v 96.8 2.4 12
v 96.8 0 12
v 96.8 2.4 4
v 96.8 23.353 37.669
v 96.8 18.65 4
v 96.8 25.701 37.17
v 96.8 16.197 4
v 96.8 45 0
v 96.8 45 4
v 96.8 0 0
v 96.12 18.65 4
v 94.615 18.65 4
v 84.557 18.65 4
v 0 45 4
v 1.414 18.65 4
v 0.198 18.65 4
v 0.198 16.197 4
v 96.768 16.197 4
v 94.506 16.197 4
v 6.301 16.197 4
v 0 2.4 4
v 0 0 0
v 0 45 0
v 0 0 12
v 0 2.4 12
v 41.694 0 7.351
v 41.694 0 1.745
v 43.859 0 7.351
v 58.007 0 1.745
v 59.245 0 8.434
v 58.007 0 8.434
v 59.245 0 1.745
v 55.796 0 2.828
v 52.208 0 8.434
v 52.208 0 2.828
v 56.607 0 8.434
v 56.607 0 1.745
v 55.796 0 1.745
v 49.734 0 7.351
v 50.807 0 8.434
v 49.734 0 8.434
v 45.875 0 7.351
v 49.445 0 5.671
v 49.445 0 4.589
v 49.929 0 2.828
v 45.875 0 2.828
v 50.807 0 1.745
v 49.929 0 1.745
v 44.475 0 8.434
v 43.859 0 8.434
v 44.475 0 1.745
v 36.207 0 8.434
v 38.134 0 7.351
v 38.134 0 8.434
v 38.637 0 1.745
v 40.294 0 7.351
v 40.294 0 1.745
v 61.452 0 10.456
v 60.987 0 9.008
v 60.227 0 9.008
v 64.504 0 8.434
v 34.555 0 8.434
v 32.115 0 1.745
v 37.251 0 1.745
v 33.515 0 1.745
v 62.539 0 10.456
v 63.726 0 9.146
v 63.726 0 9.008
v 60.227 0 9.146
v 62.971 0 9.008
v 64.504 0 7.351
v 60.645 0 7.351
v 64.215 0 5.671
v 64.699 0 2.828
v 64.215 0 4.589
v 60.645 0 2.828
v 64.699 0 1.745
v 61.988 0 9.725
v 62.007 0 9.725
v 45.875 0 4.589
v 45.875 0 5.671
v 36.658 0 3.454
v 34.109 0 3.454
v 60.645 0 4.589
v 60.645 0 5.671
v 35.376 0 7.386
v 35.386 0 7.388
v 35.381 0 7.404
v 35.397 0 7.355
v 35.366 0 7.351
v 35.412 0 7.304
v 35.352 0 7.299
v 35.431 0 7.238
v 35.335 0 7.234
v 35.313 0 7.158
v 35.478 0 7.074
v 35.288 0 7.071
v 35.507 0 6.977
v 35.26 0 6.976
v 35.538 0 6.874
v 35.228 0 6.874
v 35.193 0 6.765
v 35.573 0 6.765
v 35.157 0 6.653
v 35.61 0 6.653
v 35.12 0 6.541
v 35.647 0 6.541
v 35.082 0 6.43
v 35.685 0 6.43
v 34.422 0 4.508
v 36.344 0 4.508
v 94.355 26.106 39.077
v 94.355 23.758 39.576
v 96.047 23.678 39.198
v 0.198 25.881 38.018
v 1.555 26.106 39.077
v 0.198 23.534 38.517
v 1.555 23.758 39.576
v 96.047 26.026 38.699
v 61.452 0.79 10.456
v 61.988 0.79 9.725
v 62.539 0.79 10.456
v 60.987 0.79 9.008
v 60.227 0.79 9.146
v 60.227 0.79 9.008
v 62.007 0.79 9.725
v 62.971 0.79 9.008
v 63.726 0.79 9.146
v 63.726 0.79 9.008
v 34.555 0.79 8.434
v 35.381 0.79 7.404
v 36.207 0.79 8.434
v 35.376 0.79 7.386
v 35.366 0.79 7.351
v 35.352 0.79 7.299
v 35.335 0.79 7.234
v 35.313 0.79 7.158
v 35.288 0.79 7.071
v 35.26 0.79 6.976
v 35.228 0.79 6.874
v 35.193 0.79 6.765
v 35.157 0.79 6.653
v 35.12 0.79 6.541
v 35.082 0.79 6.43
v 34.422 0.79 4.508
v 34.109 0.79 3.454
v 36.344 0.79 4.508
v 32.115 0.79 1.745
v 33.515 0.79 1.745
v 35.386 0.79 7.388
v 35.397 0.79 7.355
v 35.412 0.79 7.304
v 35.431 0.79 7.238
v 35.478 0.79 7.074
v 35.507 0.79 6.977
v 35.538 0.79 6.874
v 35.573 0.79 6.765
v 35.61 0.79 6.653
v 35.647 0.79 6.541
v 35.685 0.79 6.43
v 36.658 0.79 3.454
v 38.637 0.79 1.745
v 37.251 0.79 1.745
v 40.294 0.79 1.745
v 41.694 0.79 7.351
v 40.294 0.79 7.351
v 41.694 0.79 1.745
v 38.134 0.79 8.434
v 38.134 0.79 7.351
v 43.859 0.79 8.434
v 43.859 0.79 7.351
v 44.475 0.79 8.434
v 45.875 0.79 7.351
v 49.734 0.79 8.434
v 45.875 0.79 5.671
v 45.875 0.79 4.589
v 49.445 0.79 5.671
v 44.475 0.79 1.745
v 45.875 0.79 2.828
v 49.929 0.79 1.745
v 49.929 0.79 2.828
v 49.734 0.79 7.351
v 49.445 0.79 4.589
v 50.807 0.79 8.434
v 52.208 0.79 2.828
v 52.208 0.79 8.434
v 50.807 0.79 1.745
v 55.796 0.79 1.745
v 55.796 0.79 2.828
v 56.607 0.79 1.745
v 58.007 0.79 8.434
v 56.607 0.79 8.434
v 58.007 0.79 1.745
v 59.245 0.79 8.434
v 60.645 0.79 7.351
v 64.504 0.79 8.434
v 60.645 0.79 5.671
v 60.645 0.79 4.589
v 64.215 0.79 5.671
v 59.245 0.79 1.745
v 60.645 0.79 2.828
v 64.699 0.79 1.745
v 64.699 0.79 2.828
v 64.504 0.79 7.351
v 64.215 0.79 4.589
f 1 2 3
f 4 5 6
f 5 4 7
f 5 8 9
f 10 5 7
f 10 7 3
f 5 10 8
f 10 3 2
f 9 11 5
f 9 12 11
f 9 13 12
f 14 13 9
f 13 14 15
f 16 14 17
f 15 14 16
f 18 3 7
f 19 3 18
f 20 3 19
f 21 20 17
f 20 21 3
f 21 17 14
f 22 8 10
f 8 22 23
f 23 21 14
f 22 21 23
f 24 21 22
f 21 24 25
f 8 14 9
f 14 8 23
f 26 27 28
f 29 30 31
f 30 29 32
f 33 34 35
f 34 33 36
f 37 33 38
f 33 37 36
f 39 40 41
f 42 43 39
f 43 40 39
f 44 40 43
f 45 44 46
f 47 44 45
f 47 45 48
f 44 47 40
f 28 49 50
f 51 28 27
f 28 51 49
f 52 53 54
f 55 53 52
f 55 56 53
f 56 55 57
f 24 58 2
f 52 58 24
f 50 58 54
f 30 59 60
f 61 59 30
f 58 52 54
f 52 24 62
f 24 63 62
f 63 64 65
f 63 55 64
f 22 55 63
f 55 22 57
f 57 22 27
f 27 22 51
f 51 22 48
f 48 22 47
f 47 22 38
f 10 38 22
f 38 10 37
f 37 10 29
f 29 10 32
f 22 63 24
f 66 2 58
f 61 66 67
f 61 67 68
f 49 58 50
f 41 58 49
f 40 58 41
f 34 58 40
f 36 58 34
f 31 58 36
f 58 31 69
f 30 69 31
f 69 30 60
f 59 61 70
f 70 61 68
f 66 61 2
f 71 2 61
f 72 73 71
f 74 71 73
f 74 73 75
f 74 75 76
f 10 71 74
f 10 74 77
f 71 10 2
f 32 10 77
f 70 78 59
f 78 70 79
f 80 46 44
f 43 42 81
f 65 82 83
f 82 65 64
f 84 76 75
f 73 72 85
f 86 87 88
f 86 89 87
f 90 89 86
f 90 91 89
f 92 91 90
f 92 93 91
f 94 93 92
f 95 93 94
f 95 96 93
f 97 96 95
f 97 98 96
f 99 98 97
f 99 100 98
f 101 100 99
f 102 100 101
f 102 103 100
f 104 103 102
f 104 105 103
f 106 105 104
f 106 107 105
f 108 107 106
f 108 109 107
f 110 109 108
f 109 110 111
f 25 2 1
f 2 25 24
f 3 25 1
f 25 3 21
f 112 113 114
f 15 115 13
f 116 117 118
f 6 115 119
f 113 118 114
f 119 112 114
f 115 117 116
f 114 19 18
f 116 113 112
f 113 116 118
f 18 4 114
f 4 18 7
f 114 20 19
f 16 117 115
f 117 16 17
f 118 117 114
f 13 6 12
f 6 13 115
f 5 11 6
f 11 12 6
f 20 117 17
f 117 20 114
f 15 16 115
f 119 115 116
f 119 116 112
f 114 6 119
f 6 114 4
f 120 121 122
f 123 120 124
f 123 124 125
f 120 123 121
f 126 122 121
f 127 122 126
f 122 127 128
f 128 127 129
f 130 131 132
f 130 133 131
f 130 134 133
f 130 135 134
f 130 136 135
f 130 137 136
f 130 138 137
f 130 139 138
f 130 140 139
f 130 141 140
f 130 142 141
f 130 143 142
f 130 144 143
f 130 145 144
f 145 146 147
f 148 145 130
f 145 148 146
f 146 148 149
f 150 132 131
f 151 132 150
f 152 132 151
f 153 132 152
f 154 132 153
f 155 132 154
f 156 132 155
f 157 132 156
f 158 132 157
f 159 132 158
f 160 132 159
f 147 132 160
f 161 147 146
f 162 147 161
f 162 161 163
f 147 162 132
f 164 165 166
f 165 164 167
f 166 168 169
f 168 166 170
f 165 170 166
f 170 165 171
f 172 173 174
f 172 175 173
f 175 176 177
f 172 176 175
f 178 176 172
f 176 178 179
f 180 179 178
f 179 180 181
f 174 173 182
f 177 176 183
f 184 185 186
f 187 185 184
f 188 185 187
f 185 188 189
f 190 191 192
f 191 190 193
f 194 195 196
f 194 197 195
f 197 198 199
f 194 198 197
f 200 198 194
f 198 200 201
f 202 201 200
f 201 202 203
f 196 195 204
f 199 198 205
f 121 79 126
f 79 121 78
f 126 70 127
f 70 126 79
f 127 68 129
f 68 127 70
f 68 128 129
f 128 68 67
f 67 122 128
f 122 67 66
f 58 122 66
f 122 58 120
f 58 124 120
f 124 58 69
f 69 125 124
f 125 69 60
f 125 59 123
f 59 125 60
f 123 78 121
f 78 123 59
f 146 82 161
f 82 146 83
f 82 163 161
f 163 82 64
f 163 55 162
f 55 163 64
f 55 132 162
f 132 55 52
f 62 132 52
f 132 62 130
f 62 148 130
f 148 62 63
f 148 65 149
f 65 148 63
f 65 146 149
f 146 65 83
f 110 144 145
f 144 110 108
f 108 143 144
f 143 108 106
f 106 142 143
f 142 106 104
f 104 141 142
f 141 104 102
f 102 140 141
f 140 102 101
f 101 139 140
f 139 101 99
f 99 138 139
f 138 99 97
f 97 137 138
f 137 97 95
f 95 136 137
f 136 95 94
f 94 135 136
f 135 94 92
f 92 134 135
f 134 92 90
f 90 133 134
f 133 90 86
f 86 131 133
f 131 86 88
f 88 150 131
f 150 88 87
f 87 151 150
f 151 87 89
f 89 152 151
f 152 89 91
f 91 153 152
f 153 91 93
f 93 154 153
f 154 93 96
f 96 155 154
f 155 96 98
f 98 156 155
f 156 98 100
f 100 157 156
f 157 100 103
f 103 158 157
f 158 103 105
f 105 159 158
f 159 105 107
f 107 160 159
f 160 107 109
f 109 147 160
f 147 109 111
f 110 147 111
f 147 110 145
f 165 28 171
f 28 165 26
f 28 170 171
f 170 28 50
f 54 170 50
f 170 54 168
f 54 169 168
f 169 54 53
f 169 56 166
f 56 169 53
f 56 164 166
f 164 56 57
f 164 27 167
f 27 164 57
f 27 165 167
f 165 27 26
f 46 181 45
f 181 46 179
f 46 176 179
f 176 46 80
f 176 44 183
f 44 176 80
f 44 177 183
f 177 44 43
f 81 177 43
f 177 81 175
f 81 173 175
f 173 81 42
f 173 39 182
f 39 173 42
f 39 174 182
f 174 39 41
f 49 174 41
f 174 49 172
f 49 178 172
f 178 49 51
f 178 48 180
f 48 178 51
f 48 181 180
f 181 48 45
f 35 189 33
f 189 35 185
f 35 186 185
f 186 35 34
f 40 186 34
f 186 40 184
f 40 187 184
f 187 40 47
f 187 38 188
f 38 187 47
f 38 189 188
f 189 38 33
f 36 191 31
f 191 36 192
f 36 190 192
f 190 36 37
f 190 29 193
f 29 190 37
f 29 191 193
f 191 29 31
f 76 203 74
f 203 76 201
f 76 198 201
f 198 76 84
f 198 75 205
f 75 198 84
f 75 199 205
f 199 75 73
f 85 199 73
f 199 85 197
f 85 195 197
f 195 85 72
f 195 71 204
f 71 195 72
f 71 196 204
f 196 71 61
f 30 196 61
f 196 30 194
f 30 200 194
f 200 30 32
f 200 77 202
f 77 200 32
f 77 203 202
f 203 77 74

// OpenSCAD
// Porta-cartão de mesa - impressão 3D
card_w = 90;         // largura do cartão (mm)
card_h = 50;         // altura do cartão (mm)
stack = 12;          // espessura da pilha de cartões (mm)
wall = 2.4;          // espessura das paredes (mm)
clearance = 1;       // folga para os cartões (mm)
tilt = 12;           // inclinação do encosto (graus)
base_d = 45;         // profundidade da base (mm)
base_h = 4;          // altura da base (mm)
lip_h = 12;          // altura da aba da frente (mm)
back_h = 40;         // altura do encosto (mm)
word = "ATELIÊ";     // texto gravado
font_size = 7;       // altura da letra (mm)
engrave = 0.8;       // profundidade da gravação (mm)

body_w = card_w + 2 * clearance + 2 * wall;
pocket = stack + clearance;

difference() {
    union() {
        cube([body_w, base_d, base_h]);
        cube([body_w, wall, lip_h]);
        translate([0, wall + pocket + wall, 0])
            rotate([-tilt, 0, 0])
                translate([0, -wall, 0])
                    hull() for (x = [2, body_w - 2], z = [2, back_h - 2])
                        translate([x, wall / 2, z]) rotate([90, 0, 0]) cylinder(r = 2, h = wall, center = true);
    }
    translate([body_w / 2, -0.01, lip_h / 2])
        rotate([90, 0, 0])
            translate([0, 0, -engrave])
                linear_extrude(engrave + 0.01)
                    text(word, size = font_size, font = "Liberation Sans:style=Bold",
                         halign = "center", valign = "center");
}

echo(str("Largura: ", body_w, " mm"));
echo(str("Profundidade: ", base_d, " mm"));
echo(str("Altura: ", back_h * cos(tilt), " mm"));
